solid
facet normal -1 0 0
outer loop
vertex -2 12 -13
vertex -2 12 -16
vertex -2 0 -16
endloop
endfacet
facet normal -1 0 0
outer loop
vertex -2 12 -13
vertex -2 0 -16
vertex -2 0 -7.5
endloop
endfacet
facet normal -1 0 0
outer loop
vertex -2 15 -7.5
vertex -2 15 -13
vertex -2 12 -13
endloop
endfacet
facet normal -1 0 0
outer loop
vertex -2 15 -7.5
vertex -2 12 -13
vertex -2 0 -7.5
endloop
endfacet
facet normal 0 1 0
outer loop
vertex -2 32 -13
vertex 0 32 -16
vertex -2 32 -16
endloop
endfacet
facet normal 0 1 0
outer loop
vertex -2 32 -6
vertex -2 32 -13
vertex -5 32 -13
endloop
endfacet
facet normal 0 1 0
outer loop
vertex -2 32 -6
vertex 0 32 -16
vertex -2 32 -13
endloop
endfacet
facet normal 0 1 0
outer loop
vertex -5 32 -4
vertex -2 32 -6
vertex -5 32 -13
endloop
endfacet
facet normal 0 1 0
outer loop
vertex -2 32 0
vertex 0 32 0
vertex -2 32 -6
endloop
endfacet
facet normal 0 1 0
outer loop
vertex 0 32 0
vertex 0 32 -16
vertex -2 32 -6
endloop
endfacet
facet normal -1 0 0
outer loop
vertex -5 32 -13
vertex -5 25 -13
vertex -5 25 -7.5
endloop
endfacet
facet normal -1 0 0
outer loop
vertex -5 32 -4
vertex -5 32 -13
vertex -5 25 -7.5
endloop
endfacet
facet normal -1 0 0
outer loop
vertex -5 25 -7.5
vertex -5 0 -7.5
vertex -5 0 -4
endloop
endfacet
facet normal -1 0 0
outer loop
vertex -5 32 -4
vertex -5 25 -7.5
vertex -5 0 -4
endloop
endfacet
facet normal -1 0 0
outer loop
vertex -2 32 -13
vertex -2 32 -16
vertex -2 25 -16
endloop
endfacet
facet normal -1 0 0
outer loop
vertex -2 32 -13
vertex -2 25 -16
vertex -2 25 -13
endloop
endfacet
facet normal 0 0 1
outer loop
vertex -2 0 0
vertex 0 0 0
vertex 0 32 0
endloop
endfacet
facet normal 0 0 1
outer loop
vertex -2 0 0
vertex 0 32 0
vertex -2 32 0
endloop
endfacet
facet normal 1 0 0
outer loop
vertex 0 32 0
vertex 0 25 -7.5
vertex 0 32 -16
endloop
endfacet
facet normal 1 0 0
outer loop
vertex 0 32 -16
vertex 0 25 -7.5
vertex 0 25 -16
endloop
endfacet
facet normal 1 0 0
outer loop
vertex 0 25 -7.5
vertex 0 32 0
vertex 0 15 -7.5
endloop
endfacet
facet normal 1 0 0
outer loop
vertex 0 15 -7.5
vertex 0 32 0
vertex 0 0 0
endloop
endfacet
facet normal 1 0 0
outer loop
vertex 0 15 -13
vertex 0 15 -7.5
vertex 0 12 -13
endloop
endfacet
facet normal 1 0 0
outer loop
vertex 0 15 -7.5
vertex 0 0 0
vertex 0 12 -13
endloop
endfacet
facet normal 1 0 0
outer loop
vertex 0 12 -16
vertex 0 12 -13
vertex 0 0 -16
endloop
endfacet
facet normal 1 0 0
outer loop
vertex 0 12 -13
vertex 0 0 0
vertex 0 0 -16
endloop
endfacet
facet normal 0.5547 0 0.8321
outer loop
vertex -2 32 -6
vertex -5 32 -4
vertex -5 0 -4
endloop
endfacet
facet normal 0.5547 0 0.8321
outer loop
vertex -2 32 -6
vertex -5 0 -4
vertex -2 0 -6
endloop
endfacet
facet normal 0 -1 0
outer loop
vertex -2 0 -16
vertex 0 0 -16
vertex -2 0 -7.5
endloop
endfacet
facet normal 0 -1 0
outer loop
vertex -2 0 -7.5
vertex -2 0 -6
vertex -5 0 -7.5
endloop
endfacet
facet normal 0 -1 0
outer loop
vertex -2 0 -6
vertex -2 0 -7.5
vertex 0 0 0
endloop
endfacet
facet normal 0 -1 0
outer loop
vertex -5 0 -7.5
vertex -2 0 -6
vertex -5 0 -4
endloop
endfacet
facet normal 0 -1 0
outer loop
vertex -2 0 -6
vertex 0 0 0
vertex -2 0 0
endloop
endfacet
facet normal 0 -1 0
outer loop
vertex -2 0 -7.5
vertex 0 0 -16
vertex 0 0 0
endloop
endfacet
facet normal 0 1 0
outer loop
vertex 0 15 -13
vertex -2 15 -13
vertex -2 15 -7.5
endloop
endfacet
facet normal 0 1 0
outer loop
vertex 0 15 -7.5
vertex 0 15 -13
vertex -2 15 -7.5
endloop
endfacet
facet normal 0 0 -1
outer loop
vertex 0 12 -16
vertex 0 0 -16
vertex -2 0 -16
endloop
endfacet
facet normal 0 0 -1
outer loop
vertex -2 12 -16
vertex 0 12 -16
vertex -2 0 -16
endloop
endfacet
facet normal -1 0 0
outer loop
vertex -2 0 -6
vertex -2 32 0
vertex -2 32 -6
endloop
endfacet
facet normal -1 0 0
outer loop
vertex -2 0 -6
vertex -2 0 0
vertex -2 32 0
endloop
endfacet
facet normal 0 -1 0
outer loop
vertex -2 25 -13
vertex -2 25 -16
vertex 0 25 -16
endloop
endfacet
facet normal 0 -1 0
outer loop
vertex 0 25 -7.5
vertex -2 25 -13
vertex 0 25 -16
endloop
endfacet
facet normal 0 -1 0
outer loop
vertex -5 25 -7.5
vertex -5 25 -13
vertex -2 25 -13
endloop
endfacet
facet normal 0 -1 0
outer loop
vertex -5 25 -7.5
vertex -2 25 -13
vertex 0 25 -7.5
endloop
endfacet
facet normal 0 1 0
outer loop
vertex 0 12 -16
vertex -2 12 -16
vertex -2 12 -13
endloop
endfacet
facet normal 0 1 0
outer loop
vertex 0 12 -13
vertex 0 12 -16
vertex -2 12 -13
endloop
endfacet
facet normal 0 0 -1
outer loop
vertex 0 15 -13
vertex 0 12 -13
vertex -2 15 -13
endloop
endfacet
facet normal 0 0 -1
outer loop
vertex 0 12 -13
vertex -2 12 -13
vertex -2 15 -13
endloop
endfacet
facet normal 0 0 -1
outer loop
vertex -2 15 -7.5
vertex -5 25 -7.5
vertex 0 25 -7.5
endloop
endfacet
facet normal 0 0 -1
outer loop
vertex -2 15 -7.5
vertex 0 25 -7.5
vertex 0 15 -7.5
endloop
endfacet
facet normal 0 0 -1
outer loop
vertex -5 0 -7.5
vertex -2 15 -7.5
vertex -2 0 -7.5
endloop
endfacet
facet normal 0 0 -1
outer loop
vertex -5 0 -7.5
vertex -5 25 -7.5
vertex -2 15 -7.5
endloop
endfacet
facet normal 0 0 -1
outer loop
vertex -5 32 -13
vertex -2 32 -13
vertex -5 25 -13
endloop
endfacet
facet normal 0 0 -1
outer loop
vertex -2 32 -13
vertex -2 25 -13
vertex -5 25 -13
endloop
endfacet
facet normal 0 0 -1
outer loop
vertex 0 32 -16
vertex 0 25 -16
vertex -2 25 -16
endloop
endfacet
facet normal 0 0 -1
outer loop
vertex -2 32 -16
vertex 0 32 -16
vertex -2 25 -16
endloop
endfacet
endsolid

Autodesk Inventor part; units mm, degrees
ref_plane "YZ Plane" through (0, 0, 0) normal (1, 0, 0) x (0, 1, 0)
ref_plane "XZ Plane" through (0, 0, 0) normal (0, 1, 0) x (-1, 0, 0)
ref_plane "XY Plane" through (0, 0, 0) normal (0, 0, 1) x (1, 0, 0)
sketch "Sketch1" plane through (0, 0, 0) normal (0, 1, 0) x (-1, 0, 0)
  line L0 (0, 0) -> (0, -16)
  line L1 (0, -16) -> (2, -16)
  line L2 (0, 0) -> (2, 0)
  line L3 (2, 0) -> (2, -6)
  line L4 (2, -16) -> (2, -13)
  line L5 (2, -13) -> (5, -13)
  line L6 (5, -13) -> (5, -4)
  line L7 (5, -4) -> (2, -6)
  dimension "d0" = 16
  dimension "d1" = 2
  dimension "d2" = 6
  dimension "d3" = 3
  dimension "d4" = 3
  dimension "d5" = 9
extrude "Extrusion1" add sketch "Sketch1" along normal blind 32
sketch "Sketch2" plane through (-5, 0, -13) normal (-1, 0, 0) x (0, 0, 1)
  line L0 (0, 0) -> (9, 0) projected
  line L1 (9, 0) -> (9, 32) projected
  line L2 (0, 32) -> (9, 32) projected
  line L3 (0, 0) -> (0, 32) projected
  line L4 (0, 0) -> (9, 0) projected
  line L5 (5.5, 0) -> (5.5, 25)
  line L6 (5.5, 25) -> (0, 25)
  point P0 (13, 0)
  dimension "d8" = 25
  dimension "d9" = 5.5
extrude "Extrusion2" cut sketch "Sketch2" against normal blind 3 contours L3 L6 L5 L0
sketch "Sketch3" plane through (-2, 0, -16) normal (-1, 0, 0) x (0, 0, 1)
  line L0 (0, 0) -> (8.5, 0) projected
  line L1 (8.5, 25) -> (8.5, 0) projected
  line L2 (3, 25) -> (8.5, 25) projected
  line L3 (3, 25) -> (3, 32) projected
  line L4 (0, 32) -> (3, 32) projected
  line L5 (0, 0) -> (0, 32) projected
  line L6 (0, 0) -> (8.5, 0) projected
  line L7 (0, 0) -> (0, 12)
  line L8 (0, 0) -> (0, 32) projected
  line L9 (0, 12) -> (3, 12)
  line L10 (3, 12) -> (3, 15)
  line L11 (3, 15) -> (8.5, 15)
  line L12 (8.5, 25) -> (8.5, 0) projected
  line L13 (3, 25) -> (3, 32) projected
  line L14 (3, 25) -> (0, 25)
  point P0 (16, 0)
  dimension "d12" = 12
  dimension "d13" = 3
  dimension "d14" = 3
extrude "Extrusion3" cut sketch "Sketch3" against normal blind 4 contours L5 L14 L2 L1 L11 L10 L9
properties part number "Inner Rails 2"
